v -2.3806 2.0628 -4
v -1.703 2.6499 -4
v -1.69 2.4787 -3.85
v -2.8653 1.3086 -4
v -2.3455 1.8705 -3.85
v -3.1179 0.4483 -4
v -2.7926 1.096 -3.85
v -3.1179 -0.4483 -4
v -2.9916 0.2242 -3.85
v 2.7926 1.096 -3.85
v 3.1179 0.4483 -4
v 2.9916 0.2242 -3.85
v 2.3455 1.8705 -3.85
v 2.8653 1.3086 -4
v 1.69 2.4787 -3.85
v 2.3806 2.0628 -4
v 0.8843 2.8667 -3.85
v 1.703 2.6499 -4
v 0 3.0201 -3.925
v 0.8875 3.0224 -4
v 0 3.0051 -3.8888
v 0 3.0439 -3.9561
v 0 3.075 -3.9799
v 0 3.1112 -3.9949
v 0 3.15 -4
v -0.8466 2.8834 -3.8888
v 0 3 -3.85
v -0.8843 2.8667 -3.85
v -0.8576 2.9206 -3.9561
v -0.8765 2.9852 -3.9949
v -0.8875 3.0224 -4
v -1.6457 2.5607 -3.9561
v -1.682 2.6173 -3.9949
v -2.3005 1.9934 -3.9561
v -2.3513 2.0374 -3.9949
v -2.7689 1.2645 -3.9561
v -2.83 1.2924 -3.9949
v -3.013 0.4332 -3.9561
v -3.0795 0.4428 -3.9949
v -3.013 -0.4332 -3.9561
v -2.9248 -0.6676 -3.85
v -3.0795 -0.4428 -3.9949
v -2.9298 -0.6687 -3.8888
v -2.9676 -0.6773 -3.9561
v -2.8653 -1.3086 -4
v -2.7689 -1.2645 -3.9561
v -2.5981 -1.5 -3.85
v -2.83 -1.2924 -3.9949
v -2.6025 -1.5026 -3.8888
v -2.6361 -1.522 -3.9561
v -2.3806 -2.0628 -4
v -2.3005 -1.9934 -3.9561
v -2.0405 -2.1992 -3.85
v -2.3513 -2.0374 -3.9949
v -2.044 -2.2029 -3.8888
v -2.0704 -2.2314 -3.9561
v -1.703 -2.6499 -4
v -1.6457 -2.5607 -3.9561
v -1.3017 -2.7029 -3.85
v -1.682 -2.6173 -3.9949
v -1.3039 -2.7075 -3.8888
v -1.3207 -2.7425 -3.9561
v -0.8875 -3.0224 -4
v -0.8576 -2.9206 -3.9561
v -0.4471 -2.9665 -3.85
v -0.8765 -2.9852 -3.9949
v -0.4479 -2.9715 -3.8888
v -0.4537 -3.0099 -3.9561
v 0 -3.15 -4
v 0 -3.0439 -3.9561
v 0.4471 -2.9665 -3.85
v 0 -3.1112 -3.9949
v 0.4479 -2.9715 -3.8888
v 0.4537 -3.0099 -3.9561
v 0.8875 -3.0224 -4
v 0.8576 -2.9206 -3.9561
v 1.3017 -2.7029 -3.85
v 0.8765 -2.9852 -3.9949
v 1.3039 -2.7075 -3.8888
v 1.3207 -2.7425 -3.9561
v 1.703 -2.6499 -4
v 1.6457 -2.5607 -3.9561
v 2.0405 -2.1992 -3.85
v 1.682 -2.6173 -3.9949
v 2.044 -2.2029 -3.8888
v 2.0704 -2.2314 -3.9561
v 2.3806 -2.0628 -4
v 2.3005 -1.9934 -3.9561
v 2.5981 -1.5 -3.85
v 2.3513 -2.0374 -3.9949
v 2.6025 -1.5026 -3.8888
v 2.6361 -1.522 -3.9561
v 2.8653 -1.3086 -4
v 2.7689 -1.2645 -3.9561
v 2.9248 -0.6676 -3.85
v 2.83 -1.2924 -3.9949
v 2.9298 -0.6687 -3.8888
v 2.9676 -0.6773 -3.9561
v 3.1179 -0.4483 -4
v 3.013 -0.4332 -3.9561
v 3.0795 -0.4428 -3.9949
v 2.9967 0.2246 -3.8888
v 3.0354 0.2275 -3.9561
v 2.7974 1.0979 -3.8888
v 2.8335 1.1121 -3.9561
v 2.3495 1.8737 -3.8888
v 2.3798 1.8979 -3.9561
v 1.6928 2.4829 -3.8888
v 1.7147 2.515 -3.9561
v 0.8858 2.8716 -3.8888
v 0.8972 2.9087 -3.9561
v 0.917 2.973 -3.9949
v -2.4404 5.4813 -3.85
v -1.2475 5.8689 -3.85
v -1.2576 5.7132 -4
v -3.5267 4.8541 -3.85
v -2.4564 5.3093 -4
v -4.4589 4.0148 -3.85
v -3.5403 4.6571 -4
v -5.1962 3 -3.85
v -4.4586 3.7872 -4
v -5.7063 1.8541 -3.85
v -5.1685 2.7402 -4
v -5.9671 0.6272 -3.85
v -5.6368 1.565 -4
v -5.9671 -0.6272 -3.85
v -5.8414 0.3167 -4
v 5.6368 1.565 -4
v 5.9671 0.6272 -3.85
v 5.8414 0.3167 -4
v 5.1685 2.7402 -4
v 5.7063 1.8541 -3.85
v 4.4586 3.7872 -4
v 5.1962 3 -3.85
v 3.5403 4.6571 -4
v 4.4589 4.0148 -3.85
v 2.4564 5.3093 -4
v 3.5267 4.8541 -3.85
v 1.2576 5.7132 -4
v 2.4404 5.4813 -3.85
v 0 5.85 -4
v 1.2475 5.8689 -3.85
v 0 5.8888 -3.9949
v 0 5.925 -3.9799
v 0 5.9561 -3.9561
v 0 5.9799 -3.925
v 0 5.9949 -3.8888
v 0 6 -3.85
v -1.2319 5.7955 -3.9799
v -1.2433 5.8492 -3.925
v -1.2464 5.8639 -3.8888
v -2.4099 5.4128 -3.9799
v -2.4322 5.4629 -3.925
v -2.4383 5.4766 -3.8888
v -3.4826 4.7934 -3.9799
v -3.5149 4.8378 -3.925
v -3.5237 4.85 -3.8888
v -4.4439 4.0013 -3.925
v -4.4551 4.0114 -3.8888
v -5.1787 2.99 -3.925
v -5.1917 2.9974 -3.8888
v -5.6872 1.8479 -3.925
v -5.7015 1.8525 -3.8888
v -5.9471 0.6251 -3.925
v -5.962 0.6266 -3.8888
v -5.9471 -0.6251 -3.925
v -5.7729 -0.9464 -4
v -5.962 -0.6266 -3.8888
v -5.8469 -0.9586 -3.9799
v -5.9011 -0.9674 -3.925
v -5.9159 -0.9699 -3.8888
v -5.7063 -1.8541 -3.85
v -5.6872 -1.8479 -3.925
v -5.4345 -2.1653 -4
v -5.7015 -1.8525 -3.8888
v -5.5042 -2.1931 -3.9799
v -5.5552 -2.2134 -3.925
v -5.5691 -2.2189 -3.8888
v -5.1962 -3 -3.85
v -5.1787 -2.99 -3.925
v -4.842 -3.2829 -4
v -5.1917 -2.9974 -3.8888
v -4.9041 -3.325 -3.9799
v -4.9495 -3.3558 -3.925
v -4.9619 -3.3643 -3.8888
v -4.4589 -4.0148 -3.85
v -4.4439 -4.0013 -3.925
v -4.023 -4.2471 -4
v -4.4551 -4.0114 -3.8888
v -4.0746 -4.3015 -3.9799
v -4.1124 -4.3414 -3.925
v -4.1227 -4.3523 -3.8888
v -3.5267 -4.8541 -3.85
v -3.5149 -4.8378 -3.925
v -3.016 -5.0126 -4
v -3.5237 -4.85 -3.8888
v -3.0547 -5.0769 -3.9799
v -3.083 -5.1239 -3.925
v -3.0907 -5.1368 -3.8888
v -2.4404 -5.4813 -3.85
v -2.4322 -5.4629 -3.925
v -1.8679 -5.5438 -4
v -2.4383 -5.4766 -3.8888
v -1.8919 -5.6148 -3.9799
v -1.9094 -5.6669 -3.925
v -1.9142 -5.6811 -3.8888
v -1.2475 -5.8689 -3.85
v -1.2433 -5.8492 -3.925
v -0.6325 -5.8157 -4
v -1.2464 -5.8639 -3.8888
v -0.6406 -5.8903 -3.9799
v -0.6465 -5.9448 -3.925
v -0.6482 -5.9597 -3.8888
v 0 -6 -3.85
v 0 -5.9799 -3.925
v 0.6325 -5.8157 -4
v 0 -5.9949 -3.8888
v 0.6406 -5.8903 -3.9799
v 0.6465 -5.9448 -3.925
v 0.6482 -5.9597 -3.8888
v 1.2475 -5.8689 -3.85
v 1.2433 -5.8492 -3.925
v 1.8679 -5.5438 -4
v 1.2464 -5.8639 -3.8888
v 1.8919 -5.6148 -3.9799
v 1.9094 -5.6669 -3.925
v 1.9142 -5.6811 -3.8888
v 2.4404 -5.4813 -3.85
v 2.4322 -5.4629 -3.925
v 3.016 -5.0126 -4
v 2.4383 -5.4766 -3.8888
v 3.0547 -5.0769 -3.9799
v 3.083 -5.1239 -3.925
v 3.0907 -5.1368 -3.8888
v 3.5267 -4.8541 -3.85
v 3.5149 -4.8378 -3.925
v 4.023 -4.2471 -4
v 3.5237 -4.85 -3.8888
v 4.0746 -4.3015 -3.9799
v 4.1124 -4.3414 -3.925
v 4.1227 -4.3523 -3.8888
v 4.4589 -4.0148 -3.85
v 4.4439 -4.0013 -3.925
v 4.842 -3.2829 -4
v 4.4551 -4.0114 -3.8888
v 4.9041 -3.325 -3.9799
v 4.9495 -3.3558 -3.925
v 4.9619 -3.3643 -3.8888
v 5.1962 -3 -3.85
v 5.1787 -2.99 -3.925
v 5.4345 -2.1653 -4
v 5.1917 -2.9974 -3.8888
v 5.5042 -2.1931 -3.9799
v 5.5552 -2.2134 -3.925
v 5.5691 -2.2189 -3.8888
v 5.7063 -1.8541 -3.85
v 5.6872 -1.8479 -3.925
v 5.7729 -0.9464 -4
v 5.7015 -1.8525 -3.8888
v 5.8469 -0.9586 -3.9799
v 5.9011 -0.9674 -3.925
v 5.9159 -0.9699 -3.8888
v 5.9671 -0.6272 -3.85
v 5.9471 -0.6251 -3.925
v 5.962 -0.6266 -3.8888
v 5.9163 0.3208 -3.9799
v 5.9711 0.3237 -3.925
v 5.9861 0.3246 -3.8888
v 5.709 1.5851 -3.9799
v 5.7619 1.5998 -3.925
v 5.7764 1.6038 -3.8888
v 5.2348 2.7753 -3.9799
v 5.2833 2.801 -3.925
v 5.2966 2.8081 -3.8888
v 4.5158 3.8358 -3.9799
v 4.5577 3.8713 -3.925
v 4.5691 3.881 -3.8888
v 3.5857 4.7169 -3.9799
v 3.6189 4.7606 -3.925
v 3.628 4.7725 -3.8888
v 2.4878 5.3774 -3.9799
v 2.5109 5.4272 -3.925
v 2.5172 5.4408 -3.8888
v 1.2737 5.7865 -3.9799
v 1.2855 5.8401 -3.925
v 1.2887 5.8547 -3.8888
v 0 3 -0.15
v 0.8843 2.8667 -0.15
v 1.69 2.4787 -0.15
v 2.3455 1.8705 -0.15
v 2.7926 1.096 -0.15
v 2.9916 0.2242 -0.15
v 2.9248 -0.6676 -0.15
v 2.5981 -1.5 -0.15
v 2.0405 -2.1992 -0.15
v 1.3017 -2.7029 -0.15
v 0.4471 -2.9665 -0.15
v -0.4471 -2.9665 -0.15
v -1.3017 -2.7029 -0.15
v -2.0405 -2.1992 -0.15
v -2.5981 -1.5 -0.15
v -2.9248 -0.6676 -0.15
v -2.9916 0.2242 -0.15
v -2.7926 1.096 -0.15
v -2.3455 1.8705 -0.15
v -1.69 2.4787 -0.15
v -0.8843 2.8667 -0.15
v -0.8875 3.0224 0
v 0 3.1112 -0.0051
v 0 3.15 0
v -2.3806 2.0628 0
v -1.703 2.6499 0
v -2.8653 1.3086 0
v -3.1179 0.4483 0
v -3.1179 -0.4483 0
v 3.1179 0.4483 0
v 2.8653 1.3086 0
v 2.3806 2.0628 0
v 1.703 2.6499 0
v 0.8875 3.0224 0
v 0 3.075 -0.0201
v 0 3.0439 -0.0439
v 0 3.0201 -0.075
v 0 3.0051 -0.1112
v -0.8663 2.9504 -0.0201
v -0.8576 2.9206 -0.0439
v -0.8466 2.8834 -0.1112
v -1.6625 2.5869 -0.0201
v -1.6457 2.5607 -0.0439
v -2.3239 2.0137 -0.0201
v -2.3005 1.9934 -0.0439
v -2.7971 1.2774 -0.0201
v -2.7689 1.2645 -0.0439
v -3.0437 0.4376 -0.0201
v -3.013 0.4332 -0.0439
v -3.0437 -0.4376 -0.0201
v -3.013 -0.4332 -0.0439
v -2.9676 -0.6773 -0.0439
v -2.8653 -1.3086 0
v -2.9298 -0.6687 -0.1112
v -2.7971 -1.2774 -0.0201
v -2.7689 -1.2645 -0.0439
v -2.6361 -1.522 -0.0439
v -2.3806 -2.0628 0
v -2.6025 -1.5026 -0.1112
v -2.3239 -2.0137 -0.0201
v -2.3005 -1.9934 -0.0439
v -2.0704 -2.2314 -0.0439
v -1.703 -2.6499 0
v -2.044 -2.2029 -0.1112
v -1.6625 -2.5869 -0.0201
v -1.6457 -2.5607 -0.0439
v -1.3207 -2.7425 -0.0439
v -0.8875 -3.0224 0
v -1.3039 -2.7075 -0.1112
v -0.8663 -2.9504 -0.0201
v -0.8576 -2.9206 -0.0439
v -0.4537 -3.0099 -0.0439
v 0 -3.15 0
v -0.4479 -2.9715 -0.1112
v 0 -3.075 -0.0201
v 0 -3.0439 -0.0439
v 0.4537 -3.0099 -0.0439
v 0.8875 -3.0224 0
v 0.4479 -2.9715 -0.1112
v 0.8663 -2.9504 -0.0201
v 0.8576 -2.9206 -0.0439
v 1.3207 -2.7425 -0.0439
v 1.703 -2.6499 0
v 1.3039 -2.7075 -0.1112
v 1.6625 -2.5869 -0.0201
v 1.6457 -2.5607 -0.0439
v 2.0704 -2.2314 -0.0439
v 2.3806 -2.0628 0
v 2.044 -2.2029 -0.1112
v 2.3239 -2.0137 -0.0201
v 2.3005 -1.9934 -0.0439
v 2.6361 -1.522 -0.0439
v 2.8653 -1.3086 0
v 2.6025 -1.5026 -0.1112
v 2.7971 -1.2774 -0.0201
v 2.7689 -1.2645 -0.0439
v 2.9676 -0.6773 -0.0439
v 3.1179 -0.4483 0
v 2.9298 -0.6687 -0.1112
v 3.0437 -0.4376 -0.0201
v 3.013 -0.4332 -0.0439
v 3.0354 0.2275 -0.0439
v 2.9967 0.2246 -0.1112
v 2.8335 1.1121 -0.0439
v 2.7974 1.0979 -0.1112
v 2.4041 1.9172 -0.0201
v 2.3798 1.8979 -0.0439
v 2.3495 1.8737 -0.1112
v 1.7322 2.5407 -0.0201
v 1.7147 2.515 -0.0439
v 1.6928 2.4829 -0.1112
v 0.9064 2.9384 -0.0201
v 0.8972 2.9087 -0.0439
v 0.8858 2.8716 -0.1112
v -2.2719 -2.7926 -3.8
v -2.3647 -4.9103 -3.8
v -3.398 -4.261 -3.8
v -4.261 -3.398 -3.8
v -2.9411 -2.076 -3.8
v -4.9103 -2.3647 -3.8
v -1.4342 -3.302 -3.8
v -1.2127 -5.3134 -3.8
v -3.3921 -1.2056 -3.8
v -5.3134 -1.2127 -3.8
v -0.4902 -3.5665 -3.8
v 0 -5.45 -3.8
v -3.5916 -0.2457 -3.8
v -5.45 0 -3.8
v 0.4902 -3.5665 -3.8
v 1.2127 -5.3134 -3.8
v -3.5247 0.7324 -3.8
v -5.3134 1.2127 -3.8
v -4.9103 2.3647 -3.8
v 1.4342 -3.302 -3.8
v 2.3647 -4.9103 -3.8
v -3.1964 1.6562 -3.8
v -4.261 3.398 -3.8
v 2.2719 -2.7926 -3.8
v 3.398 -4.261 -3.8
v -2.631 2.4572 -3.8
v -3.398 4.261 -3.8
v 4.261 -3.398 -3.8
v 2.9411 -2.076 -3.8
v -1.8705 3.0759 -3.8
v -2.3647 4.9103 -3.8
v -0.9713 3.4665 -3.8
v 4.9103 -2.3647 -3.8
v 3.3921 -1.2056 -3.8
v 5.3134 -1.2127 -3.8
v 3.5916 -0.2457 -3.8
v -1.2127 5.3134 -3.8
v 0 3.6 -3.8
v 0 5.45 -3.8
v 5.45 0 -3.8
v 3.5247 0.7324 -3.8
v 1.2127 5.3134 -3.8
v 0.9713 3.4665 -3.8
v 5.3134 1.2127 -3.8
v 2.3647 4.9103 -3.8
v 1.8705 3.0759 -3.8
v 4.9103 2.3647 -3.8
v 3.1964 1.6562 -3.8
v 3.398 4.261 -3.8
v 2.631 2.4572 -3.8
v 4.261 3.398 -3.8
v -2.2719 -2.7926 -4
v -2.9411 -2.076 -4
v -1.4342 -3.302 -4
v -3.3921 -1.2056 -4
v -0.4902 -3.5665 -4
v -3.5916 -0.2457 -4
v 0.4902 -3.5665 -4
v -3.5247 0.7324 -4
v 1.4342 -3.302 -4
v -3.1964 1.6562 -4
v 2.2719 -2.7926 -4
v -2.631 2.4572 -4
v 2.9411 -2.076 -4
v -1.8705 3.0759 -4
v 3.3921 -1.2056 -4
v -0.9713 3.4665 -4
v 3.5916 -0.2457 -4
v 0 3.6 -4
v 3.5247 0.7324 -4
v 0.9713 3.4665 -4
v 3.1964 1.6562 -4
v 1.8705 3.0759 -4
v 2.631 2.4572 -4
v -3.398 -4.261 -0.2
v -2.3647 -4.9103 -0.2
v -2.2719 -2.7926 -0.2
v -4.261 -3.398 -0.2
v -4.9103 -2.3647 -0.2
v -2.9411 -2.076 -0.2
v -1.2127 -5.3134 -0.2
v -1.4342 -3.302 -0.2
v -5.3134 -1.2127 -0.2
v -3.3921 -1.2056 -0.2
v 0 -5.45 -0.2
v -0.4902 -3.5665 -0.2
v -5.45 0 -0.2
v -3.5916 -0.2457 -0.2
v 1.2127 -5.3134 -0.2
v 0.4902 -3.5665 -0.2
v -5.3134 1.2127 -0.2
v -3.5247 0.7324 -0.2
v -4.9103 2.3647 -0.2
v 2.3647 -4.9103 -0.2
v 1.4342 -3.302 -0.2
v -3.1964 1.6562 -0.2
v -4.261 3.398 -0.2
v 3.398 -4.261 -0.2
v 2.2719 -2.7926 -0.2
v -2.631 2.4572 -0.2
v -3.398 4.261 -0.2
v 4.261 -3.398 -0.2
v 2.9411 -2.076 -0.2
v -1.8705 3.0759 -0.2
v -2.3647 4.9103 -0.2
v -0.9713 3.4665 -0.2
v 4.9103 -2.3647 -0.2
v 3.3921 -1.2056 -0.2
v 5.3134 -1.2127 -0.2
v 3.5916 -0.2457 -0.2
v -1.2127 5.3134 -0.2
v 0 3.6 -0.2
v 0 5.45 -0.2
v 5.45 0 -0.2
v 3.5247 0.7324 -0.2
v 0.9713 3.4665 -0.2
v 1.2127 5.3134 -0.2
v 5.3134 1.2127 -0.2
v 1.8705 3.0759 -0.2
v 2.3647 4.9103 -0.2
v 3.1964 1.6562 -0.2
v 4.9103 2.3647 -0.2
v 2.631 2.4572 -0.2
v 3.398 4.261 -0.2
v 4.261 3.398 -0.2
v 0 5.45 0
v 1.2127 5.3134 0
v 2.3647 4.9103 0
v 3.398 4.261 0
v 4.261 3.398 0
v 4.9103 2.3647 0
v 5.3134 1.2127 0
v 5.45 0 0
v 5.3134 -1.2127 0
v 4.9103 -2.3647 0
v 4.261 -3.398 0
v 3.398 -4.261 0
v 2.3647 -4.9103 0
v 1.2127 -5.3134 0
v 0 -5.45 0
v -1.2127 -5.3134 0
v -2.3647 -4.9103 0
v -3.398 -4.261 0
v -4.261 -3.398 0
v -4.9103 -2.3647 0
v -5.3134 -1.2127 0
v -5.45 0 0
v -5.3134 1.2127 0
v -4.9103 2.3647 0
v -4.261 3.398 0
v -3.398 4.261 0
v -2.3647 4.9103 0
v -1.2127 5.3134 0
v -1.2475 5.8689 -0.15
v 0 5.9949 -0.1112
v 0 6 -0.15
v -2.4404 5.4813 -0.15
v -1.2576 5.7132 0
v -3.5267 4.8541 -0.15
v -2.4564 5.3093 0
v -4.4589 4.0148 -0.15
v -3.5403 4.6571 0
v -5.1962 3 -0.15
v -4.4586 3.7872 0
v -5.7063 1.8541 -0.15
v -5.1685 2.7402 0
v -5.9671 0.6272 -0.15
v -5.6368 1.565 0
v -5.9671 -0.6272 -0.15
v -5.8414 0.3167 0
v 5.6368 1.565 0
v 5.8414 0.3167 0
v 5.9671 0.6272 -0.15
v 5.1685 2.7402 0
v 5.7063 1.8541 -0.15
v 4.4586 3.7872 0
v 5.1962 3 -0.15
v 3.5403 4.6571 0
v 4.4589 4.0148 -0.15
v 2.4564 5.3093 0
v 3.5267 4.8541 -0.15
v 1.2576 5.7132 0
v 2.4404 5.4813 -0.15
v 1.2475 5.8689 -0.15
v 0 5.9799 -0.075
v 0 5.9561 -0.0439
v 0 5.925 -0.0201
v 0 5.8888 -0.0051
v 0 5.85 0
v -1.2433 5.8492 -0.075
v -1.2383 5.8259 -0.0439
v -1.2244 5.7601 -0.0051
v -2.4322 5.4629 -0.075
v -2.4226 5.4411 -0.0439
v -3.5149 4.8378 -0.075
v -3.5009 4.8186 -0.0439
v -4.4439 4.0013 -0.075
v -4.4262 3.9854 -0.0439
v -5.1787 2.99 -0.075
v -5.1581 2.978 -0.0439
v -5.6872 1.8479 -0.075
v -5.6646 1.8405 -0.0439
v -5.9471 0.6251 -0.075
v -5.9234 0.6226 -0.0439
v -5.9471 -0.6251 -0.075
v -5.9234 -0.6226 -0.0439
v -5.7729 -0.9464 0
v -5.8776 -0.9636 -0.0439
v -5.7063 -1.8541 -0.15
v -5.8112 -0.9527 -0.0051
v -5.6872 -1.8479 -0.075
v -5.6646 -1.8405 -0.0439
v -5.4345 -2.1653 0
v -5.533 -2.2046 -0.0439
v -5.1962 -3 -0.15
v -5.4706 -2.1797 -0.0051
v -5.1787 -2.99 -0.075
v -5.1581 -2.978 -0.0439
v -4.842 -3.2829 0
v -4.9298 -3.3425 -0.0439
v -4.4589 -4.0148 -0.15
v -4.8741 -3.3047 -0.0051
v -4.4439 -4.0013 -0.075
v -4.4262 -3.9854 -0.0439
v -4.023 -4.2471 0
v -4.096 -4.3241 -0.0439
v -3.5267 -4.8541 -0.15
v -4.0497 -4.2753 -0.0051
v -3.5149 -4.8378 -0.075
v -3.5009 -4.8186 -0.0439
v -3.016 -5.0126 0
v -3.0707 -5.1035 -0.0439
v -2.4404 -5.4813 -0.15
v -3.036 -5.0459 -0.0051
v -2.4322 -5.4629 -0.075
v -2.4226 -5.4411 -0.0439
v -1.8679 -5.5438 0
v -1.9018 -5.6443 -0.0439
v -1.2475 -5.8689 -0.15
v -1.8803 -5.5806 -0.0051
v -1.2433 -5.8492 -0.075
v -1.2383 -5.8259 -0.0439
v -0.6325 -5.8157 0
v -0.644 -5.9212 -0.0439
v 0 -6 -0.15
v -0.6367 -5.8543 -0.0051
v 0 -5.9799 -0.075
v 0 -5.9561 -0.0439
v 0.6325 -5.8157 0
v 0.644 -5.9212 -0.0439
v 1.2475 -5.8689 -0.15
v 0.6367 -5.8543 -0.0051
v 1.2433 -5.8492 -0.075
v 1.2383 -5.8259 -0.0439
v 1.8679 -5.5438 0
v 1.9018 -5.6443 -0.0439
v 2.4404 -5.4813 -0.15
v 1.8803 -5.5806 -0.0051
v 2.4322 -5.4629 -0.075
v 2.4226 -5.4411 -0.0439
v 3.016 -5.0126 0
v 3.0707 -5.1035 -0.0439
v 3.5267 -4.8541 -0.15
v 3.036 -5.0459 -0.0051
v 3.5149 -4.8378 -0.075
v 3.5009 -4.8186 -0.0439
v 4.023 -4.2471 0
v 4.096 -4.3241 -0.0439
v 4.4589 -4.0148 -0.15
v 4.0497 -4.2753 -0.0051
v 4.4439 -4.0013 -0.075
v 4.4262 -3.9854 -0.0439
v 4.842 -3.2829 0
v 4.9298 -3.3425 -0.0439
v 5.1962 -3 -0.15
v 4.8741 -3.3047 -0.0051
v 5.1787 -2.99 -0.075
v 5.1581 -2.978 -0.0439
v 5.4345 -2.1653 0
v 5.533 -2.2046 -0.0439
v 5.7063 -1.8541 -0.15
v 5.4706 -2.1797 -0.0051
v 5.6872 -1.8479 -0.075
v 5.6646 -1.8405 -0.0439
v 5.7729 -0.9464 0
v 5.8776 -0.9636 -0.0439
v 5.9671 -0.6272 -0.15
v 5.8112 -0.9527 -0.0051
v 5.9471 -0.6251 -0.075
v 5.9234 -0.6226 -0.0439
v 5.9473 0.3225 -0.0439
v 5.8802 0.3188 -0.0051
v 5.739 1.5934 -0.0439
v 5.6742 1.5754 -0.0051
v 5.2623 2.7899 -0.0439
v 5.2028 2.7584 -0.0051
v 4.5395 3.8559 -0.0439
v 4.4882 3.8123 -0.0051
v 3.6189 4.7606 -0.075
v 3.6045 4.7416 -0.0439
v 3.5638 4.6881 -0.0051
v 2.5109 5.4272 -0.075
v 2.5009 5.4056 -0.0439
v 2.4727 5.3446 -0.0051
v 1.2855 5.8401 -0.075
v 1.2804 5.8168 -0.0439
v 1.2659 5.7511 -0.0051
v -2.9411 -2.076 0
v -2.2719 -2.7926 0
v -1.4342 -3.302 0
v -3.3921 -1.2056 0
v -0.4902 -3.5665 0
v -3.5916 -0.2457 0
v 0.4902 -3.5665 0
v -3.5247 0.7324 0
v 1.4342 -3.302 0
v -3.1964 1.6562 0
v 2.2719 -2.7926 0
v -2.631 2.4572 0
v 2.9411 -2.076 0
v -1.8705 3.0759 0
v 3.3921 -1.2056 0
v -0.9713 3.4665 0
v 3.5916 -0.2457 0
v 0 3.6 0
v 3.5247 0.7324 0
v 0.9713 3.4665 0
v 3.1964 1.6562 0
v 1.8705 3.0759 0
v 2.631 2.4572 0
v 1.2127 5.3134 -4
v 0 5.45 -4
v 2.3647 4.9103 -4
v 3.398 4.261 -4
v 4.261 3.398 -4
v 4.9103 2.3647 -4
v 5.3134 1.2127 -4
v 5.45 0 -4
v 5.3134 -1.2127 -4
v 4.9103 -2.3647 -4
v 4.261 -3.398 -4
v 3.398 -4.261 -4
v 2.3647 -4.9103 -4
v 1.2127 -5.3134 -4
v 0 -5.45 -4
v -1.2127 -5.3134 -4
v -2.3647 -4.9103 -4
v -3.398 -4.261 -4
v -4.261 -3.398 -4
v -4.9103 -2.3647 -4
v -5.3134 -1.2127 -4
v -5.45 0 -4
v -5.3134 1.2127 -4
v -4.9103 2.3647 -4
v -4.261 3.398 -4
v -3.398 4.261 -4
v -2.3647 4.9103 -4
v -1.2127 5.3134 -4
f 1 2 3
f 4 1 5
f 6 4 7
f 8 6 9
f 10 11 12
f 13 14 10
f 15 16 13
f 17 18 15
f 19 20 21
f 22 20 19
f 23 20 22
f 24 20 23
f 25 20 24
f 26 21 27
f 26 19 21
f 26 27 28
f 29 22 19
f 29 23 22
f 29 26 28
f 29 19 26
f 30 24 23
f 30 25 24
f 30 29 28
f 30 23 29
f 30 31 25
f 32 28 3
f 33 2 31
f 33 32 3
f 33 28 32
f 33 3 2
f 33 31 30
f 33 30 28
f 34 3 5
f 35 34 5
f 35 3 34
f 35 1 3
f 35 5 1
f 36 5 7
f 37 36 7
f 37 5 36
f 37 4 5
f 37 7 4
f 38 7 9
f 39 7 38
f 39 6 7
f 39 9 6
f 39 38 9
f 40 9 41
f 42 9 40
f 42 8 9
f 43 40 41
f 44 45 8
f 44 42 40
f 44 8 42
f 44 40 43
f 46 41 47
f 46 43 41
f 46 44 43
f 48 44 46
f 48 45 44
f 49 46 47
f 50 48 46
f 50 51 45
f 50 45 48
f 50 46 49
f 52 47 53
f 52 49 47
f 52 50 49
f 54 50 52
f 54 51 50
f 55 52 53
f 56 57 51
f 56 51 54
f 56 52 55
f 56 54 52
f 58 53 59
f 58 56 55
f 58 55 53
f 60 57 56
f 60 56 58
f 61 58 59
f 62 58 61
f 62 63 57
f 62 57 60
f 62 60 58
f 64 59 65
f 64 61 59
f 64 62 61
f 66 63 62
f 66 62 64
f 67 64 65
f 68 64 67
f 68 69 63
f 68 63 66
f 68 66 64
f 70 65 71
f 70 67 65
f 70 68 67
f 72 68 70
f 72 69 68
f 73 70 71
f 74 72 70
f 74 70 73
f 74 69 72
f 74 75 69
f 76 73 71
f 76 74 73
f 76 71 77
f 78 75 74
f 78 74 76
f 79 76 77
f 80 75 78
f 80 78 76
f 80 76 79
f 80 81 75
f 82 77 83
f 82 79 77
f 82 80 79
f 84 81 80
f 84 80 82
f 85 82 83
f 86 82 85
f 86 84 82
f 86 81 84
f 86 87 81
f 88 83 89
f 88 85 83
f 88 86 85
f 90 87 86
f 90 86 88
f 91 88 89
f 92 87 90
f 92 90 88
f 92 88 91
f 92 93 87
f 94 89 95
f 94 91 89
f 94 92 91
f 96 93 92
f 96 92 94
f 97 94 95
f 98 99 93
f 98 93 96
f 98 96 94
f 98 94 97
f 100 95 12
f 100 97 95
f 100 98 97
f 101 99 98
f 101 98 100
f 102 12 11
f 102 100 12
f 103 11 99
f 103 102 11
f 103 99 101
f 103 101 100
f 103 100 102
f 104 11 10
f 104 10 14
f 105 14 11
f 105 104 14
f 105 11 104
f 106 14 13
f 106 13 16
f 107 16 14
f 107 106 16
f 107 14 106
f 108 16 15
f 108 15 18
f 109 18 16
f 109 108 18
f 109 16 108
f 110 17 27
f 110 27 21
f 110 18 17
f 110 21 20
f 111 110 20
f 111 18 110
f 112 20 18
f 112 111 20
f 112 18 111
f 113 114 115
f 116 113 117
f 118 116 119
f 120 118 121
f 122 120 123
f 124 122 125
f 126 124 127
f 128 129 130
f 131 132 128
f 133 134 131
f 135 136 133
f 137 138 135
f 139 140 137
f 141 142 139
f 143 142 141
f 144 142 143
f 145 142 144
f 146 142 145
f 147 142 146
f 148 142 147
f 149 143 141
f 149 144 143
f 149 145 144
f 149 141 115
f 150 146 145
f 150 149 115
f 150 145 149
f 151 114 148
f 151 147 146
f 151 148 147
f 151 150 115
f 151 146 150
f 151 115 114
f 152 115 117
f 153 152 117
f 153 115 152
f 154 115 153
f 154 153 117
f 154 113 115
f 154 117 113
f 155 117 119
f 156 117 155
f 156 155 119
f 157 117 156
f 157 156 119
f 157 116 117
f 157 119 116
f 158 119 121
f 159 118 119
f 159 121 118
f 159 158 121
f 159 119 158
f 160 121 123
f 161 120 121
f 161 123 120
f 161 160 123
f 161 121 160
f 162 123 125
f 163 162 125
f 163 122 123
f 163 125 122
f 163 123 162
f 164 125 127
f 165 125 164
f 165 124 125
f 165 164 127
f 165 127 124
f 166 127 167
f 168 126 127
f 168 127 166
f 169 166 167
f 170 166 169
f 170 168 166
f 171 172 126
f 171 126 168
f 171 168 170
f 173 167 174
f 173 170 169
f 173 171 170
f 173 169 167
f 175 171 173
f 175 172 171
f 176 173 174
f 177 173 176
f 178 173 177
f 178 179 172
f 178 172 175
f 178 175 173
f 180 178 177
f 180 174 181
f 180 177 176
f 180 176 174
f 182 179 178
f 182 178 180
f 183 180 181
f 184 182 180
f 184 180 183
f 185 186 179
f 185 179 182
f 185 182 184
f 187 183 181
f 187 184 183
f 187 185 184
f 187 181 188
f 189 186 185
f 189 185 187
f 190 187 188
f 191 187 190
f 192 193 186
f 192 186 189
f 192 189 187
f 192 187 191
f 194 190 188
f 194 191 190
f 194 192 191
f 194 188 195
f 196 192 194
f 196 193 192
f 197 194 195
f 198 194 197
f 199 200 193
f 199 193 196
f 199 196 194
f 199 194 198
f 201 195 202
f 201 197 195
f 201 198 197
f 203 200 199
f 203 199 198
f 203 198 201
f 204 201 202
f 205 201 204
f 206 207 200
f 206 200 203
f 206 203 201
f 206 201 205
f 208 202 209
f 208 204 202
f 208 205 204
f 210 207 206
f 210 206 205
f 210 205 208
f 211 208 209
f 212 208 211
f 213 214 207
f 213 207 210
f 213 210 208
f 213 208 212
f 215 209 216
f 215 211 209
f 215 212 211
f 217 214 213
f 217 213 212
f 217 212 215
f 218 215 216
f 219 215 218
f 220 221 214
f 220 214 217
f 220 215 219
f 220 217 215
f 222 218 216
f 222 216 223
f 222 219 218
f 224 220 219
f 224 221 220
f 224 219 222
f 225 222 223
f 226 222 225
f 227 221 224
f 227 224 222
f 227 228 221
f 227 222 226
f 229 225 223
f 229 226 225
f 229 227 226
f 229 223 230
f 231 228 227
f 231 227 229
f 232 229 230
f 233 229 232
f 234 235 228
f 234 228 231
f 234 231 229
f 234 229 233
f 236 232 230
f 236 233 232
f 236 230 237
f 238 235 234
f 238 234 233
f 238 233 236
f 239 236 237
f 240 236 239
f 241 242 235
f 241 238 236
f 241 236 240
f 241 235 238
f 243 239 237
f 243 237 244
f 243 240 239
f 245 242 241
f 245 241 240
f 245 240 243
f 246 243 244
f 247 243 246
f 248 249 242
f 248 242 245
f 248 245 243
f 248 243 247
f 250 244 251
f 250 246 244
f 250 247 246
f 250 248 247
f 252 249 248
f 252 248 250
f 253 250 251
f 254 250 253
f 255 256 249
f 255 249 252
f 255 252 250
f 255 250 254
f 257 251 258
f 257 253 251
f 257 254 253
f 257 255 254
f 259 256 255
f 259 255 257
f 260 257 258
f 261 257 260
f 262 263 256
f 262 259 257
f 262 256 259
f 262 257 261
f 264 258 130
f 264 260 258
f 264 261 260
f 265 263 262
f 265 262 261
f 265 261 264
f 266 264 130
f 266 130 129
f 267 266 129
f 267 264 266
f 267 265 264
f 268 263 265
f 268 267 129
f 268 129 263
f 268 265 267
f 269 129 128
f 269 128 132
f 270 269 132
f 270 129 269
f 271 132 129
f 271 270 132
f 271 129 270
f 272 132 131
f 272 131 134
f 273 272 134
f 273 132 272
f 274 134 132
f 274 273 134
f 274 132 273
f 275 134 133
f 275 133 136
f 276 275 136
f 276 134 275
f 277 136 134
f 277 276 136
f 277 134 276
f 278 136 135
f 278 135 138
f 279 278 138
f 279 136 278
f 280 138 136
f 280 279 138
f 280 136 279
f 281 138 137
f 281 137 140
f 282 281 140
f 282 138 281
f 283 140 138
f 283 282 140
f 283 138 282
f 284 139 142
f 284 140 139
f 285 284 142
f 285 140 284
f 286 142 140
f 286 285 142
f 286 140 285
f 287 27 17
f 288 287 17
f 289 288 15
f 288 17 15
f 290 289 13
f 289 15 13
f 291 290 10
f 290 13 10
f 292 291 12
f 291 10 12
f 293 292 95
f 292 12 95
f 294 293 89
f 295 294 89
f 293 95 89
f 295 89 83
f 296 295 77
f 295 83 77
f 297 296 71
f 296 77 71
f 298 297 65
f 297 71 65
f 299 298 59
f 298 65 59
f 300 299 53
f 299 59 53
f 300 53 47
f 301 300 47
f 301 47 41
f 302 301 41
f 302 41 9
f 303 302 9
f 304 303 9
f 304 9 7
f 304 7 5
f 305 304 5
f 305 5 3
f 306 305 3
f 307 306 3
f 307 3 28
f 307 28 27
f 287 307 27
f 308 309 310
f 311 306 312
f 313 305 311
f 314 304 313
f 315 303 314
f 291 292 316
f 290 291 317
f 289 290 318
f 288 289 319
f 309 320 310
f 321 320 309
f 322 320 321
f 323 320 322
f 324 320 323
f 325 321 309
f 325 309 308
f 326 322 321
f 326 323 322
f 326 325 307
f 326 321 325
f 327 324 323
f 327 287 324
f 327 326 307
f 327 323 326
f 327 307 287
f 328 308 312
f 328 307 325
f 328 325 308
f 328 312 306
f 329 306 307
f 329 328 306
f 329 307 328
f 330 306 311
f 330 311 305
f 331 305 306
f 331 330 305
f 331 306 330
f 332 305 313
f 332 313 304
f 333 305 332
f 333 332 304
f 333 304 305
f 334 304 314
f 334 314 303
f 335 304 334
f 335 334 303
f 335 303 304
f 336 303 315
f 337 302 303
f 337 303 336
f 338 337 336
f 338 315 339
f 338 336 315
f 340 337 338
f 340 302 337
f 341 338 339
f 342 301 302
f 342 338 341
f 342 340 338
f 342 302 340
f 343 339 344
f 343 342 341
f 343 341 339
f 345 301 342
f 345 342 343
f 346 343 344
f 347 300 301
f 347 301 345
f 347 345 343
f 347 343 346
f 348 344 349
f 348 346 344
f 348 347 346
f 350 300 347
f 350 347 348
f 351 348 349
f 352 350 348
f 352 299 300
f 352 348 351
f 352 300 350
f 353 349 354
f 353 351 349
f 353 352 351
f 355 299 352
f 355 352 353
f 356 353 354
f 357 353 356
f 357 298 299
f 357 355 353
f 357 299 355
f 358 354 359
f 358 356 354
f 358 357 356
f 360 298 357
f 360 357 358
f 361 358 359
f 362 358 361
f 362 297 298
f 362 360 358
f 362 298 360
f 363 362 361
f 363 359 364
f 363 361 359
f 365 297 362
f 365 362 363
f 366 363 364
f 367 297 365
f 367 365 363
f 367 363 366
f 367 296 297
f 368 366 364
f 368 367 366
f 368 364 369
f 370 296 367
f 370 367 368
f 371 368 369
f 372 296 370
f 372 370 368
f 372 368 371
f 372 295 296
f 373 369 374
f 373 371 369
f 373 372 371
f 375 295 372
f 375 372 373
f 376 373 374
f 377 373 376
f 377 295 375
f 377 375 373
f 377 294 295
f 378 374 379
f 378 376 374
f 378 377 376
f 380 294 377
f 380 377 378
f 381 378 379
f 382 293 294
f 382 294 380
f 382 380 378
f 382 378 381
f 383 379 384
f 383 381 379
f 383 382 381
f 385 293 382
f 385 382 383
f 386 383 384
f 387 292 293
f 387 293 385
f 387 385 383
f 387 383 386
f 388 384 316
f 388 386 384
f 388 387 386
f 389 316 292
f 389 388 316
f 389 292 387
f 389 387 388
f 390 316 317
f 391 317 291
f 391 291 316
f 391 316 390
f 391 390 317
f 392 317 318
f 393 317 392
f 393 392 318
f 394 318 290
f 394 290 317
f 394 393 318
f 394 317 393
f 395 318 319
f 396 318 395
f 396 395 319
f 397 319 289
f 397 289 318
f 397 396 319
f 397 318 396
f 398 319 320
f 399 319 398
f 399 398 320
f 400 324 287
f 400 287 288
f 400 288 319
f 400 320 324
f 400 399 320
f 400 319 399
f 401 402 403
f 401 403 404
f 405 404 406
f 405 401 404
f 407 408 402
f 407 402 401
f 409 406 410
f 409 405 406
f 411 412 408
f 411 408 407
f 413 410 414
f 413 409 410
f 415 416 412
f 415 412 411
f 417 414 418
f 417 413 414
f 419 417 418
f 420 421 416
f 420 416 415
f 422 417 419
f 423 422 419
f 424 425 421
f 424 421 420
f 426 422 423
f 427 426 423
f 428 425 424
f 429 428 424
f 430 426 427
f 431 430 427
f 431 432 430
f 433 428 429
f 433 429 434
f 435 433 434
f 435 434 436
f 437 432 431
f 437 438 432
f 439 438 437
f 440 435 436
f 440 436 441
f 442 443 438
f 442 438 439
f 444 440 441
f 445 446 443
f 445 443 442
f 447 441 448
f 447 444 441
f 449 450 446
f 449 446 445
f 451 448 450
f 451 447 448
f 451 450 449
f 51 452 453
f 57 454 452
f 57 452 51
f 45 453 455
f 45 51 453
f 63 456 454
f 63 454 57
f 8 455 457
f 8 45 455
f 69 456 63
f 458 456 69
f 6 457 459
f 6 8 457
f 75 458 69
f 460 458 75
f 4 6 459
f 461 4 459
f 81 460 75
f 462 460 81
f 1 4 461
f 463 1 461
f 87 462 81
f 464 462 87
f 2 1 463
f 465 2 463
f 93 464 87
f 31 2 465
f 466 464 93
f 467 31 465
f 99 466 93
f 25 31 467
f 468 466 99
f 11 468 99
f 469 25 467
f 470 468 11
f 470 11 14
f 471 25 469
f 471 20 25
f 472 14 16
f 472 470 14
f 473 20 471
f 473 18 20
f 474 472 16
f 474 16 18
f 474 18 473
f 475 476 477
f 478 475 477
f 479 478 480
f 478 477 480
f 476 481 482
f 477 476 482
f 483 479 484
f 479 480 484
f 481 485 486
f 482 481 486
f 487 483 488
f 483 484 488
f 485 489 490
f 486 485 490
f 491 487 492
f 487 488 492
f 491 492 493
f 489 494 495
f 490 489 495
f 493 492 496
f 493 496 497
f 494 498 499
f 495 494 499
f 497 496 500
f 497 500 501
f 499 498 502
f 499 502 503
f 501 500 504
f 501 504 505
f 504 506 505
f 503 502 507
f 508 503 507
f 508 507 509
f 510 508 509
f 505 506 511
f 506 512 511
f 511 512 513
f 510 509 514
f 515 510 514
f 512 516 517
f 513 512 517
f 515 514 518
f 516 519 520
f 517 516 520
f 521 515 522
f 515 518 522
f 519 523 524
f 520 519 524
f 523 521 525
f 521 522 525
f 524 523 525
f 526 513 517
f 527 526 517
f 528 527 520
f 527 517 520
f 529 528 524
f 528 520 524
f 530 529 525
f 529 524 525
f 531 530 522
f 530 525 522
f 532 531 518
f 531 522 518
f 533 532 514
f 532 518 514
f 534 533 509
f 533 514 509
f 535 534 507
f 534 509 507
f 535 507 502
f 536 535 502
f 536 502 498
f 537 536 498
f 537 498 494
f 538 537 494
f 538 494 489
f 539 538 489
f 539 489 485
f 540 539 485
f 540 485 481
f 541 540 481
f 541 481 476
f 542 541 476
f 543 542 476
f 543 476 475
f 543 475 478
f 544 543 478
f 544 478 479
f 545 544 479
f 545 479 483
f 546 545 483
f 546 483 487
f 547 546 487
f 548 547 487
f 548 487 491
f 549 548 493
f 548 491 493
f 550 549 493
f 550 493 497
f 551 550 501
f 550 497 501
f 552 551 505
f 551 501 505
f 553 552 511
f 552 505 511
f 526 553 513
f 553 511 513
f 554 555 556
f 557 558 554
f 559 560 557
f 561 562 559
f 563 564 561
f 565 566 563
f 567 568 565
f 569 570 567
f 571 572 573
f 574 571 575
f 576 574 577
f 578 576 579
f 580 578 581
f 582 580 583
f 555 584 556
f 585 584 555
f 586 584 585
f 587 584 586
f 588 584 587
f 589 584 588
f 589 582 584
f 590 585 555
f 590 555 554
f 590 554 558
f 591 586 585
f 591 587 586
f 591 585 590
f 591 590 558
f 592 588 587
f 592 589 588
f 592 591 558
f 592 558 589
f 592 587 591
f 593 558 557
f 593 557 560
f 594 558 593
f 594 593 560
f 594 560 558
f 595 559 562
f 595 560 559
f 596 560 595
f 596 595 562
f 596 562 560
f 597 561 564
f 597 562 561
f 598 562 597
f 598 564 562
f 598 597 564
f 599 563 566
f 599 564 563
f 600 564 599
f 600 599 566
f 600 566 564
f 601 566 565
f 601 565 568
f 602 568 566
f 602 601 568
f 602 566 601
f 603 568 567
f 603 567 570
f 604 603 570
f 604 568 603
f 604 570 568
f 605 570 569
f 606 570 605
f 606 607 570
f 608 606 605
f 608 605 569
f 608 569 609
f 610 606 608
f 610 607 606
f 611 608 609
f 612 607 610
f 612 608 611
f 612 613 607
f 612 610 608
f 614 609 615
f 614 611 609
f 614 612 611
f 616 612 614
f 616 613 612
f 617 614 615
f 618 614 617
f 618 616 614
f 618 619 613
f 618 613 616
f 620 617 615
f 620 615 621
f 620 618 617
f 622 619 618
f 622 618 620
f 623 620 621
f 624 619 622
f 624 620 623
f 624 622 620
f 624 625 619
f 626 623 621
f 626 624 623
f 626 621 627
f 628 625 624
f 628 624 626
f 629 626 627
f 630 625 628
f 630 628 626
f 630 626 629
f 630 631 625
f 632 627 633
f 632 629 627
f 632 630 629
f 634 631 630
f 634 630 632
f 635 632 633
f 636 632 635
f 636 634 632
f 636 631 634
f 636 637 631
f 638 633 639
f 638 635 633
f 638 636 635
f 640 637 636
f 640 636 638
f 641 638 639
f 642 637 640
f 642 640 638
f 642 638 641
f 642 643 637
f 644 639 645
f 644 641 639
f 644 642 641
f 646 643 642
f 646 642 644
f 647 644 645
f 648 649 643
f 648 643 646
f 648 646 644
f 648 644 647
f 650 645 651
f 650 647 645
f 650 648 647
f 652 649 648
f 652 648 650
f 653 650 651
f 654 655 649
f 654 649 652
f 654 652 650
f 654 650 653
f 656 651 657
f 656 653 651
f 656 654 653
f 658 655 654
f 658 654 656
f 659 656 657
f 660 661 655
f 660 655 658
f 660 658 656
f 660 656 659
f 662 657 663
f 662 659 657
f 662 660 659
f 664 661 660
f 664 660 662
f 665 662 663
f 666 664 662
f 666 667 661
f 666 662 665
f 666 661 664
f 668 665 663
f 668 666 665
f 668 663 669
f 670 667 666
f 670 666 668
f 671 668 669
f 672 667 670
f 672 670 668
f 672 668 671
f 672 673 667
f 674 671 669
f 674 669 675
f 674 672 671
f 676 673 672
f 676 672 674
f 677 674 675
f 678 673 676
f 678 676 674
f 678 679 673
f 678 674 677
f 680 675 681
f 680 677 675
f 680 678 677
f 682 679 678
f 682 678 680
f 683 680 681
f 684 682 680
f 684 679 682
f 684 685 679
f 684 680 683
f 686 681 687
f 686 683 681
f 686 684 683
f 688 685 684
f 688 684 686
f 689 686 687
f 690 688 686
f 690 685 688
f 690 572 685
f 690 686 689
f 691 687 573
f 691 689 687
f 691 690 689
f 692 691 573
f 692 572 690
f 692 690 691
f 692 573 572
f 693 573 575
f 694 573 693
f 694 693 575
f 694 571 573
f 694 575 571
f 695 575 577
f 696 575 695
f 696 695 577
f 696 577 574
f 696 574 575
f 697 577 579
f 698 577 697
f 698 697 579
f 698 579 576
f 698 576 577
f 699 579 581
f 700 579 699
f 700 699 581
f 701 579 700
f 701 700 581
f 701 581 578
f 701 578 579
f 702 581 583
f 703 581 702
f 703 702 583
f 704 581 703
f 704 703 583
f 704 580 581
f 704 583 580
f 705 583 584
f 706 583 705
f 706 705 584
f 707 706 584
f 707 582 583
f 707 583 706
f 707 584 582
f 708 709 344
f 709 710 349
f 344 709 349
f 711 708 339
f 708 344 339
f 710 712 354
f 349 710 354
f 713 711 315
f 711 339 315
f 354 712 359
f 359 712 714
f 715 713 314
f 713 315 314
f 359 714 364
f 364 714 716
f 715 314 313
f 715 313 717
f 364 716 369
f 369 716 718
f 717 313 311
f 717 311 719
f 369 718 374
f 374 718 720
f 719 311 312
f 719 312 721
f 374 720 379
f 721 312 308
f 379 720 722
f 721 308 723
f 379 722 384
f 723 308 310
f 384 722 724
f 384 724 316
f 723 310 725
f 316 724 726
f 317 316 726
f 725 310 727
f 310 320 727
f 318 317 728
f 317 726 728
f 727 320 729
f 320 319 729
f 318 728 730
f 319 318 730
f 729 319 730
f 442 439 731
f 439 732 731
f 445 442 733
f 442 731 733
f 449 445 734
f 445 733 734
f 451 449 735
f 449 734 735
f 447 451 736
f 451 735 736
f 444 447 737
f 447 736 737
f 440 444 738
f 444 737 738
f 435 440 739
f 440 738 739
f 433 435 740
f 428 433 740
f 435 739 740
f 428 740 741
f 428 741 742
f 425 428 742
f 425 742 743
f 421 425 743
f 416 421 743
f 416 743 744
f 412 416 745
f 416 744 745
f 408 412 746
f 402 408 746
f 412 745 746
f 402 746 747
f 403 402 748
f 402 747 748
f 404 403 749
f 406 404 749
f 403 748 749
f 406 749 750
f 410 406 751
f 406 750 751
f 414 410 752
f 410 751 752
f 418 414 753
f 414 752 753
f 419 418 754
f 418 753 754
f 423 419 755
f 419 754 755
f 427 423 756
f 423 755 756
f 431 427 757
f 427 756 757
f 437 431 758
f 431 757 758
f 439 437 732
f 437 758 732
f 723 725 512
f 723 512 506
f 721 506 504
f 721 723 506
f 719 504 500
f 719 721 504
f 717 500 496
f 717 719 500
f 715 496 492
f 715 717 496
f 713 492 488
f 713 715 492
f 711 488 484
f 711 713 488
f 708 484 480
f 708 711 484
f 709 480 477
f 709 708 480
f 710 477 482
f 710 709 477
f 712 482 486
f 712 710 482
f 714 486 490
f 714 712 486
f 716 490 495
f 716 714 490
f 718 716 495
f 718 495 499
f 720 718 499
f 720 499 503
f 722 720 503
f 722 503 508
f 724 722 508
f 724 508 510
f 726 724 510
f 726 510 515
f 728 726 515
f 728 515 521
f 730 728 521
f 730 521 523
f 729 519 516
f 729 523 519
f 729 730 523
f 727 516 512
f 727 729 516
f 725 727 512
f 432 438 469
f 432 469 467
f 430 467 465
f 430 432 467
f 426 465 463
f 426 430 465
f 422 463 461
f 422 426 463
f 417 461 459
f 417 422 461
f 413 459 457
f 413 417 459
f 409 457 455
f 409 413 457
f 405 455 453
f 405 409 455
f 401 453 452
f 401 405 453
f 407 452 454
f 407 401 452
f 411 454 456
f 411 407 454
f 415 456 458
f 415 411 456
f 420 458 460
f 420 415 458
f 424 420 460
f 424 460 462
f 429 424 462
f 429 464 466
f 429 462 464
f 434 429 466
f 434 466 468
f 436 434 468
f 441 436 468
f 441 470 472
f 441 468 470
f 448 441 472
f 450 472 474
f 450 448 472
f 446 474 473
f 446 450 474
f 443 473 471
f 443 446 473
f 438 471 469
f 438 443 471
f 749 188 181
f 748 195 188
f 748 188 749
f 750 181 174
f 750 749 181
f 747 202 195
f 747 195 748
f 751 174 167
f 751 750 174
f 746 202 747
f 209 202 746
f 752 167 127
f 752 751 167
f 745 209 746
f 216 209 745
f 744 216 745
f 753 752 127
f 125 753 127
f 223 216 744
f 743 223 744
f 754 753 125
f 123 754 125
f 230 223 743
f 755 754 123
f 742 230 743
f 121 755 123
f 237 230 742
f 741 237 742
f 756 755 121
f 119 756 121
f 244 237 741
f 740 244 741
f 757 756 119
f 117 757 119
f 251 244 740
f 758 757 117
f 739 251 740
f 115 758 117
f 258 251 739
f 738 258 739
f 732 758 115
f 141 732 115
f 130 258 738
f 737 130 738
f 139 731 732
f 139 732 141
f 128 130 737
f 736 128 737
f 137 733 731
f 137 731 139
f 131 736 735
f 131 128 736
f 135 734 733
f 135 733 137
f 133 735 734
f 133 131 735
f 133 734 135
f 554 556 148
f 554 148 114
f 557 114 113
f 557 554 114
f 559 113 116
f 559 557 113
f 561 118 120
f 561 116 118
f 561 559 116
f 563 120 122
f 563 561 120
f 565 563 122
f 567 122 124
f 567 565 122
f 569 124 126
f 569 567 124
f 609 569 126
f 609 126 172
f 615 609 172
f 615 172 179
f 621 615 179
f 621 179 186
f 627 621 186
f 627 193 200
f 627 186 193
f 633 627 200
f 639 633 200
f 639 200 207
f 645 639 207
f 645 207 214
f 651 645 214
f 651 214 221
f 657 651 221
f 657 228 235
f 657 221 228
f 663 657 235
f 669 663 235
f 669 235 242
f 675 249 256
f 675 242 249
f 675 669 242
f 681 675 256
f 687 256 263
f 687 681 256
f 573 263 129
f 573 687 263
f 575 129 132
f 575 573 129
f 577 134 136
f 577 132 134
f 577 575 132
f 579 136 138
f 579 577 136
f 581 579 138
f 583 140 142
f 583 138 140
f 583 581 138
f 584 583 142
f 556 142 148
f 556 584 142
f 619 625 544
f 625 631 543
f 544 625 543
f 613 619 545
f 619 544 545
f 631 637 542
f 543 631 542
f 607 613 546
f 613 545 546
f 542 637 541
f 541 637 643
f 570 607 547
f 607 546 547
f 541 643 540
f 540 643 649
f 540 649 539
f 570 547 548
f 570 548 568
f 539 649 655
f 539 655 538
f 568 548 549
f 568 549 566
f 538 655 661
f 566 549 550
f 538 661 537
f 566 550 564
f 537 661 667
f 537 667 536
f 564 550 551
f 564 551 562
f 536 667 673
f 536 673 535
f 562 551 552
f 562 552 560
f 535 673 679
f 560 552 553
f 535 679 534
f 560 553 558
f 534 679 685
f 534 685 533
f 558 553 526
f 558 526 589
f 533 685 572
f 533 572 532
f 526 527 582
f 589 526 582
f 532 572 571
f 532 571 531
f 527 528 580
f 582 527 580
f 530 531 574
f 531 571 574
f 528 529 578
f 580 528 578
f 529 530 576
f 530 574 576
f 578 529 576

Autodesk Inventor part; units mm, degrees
sketch "Sketch_1" plane through (0, 0, 0) normal (1, 0, 0) x (0, 0, -1)
  line L0 (4, 0) -> (0, 0)
  arc A0 (0, 3.15) -> (0.15, 3) centre (0.15, 3.15) ccw
  line L1 (0.15, 3) -> (3.85, 3)
  arc A1 (3.85, 3) -> (4, 3.15) centre (3.85, 3.15) ccw
  line L2 (4, 3.15) -> (4, 3.6)
  line L3 (4, 3.6) -> (3.8, 3.6)
  line L4 (3.8, 3.6) -> (3.8, 5.45)
  line L5 (3.8, 5.45) -> (4, 5.45)
  line L6 (4, 5.45) -> (4, 5.85)
  arc A2 (4, 5.85) -> (3.85, 6) centre (3.85, 5.85) ccw
  line L7 (3.85, 6) -> (0.15, 6)
  arc A3 (0.15, 6) -> (0, 5.85) centre (0.15, 5.85) ccw
  line L8 (0, 5.85) -> (0, 5.45)
  line L9 (0, 5.45) -> (0.2, 5.45)
  line L10 (0.2, 5.45) -> (0.2, 3.6)
  line L11 (0.2, 3.6) -> (0, 3.6)
  line L12 (0, 3.6) -> (0, 3.15)
revolve "Revolution1" add sketch "Sketch_1" angle 360 about axis through (0, 0, -4) along (0, 0, -1)
ref_plane "to_housing_XY" through (0, 0, 0) normal (0, 0, -1) x (1, 0, 0)
ref_plane "to_housing_YZ" through (0, 0, 0) normal (1, 0, 0) x (0, -1, 0)
ref_plane "to_housing_ZX" through (0, 0, 0) normal (0, -1, 0) x (0, 0, -1)
properties part number "MR126ZZ" material "鋼、炭素鋼"
